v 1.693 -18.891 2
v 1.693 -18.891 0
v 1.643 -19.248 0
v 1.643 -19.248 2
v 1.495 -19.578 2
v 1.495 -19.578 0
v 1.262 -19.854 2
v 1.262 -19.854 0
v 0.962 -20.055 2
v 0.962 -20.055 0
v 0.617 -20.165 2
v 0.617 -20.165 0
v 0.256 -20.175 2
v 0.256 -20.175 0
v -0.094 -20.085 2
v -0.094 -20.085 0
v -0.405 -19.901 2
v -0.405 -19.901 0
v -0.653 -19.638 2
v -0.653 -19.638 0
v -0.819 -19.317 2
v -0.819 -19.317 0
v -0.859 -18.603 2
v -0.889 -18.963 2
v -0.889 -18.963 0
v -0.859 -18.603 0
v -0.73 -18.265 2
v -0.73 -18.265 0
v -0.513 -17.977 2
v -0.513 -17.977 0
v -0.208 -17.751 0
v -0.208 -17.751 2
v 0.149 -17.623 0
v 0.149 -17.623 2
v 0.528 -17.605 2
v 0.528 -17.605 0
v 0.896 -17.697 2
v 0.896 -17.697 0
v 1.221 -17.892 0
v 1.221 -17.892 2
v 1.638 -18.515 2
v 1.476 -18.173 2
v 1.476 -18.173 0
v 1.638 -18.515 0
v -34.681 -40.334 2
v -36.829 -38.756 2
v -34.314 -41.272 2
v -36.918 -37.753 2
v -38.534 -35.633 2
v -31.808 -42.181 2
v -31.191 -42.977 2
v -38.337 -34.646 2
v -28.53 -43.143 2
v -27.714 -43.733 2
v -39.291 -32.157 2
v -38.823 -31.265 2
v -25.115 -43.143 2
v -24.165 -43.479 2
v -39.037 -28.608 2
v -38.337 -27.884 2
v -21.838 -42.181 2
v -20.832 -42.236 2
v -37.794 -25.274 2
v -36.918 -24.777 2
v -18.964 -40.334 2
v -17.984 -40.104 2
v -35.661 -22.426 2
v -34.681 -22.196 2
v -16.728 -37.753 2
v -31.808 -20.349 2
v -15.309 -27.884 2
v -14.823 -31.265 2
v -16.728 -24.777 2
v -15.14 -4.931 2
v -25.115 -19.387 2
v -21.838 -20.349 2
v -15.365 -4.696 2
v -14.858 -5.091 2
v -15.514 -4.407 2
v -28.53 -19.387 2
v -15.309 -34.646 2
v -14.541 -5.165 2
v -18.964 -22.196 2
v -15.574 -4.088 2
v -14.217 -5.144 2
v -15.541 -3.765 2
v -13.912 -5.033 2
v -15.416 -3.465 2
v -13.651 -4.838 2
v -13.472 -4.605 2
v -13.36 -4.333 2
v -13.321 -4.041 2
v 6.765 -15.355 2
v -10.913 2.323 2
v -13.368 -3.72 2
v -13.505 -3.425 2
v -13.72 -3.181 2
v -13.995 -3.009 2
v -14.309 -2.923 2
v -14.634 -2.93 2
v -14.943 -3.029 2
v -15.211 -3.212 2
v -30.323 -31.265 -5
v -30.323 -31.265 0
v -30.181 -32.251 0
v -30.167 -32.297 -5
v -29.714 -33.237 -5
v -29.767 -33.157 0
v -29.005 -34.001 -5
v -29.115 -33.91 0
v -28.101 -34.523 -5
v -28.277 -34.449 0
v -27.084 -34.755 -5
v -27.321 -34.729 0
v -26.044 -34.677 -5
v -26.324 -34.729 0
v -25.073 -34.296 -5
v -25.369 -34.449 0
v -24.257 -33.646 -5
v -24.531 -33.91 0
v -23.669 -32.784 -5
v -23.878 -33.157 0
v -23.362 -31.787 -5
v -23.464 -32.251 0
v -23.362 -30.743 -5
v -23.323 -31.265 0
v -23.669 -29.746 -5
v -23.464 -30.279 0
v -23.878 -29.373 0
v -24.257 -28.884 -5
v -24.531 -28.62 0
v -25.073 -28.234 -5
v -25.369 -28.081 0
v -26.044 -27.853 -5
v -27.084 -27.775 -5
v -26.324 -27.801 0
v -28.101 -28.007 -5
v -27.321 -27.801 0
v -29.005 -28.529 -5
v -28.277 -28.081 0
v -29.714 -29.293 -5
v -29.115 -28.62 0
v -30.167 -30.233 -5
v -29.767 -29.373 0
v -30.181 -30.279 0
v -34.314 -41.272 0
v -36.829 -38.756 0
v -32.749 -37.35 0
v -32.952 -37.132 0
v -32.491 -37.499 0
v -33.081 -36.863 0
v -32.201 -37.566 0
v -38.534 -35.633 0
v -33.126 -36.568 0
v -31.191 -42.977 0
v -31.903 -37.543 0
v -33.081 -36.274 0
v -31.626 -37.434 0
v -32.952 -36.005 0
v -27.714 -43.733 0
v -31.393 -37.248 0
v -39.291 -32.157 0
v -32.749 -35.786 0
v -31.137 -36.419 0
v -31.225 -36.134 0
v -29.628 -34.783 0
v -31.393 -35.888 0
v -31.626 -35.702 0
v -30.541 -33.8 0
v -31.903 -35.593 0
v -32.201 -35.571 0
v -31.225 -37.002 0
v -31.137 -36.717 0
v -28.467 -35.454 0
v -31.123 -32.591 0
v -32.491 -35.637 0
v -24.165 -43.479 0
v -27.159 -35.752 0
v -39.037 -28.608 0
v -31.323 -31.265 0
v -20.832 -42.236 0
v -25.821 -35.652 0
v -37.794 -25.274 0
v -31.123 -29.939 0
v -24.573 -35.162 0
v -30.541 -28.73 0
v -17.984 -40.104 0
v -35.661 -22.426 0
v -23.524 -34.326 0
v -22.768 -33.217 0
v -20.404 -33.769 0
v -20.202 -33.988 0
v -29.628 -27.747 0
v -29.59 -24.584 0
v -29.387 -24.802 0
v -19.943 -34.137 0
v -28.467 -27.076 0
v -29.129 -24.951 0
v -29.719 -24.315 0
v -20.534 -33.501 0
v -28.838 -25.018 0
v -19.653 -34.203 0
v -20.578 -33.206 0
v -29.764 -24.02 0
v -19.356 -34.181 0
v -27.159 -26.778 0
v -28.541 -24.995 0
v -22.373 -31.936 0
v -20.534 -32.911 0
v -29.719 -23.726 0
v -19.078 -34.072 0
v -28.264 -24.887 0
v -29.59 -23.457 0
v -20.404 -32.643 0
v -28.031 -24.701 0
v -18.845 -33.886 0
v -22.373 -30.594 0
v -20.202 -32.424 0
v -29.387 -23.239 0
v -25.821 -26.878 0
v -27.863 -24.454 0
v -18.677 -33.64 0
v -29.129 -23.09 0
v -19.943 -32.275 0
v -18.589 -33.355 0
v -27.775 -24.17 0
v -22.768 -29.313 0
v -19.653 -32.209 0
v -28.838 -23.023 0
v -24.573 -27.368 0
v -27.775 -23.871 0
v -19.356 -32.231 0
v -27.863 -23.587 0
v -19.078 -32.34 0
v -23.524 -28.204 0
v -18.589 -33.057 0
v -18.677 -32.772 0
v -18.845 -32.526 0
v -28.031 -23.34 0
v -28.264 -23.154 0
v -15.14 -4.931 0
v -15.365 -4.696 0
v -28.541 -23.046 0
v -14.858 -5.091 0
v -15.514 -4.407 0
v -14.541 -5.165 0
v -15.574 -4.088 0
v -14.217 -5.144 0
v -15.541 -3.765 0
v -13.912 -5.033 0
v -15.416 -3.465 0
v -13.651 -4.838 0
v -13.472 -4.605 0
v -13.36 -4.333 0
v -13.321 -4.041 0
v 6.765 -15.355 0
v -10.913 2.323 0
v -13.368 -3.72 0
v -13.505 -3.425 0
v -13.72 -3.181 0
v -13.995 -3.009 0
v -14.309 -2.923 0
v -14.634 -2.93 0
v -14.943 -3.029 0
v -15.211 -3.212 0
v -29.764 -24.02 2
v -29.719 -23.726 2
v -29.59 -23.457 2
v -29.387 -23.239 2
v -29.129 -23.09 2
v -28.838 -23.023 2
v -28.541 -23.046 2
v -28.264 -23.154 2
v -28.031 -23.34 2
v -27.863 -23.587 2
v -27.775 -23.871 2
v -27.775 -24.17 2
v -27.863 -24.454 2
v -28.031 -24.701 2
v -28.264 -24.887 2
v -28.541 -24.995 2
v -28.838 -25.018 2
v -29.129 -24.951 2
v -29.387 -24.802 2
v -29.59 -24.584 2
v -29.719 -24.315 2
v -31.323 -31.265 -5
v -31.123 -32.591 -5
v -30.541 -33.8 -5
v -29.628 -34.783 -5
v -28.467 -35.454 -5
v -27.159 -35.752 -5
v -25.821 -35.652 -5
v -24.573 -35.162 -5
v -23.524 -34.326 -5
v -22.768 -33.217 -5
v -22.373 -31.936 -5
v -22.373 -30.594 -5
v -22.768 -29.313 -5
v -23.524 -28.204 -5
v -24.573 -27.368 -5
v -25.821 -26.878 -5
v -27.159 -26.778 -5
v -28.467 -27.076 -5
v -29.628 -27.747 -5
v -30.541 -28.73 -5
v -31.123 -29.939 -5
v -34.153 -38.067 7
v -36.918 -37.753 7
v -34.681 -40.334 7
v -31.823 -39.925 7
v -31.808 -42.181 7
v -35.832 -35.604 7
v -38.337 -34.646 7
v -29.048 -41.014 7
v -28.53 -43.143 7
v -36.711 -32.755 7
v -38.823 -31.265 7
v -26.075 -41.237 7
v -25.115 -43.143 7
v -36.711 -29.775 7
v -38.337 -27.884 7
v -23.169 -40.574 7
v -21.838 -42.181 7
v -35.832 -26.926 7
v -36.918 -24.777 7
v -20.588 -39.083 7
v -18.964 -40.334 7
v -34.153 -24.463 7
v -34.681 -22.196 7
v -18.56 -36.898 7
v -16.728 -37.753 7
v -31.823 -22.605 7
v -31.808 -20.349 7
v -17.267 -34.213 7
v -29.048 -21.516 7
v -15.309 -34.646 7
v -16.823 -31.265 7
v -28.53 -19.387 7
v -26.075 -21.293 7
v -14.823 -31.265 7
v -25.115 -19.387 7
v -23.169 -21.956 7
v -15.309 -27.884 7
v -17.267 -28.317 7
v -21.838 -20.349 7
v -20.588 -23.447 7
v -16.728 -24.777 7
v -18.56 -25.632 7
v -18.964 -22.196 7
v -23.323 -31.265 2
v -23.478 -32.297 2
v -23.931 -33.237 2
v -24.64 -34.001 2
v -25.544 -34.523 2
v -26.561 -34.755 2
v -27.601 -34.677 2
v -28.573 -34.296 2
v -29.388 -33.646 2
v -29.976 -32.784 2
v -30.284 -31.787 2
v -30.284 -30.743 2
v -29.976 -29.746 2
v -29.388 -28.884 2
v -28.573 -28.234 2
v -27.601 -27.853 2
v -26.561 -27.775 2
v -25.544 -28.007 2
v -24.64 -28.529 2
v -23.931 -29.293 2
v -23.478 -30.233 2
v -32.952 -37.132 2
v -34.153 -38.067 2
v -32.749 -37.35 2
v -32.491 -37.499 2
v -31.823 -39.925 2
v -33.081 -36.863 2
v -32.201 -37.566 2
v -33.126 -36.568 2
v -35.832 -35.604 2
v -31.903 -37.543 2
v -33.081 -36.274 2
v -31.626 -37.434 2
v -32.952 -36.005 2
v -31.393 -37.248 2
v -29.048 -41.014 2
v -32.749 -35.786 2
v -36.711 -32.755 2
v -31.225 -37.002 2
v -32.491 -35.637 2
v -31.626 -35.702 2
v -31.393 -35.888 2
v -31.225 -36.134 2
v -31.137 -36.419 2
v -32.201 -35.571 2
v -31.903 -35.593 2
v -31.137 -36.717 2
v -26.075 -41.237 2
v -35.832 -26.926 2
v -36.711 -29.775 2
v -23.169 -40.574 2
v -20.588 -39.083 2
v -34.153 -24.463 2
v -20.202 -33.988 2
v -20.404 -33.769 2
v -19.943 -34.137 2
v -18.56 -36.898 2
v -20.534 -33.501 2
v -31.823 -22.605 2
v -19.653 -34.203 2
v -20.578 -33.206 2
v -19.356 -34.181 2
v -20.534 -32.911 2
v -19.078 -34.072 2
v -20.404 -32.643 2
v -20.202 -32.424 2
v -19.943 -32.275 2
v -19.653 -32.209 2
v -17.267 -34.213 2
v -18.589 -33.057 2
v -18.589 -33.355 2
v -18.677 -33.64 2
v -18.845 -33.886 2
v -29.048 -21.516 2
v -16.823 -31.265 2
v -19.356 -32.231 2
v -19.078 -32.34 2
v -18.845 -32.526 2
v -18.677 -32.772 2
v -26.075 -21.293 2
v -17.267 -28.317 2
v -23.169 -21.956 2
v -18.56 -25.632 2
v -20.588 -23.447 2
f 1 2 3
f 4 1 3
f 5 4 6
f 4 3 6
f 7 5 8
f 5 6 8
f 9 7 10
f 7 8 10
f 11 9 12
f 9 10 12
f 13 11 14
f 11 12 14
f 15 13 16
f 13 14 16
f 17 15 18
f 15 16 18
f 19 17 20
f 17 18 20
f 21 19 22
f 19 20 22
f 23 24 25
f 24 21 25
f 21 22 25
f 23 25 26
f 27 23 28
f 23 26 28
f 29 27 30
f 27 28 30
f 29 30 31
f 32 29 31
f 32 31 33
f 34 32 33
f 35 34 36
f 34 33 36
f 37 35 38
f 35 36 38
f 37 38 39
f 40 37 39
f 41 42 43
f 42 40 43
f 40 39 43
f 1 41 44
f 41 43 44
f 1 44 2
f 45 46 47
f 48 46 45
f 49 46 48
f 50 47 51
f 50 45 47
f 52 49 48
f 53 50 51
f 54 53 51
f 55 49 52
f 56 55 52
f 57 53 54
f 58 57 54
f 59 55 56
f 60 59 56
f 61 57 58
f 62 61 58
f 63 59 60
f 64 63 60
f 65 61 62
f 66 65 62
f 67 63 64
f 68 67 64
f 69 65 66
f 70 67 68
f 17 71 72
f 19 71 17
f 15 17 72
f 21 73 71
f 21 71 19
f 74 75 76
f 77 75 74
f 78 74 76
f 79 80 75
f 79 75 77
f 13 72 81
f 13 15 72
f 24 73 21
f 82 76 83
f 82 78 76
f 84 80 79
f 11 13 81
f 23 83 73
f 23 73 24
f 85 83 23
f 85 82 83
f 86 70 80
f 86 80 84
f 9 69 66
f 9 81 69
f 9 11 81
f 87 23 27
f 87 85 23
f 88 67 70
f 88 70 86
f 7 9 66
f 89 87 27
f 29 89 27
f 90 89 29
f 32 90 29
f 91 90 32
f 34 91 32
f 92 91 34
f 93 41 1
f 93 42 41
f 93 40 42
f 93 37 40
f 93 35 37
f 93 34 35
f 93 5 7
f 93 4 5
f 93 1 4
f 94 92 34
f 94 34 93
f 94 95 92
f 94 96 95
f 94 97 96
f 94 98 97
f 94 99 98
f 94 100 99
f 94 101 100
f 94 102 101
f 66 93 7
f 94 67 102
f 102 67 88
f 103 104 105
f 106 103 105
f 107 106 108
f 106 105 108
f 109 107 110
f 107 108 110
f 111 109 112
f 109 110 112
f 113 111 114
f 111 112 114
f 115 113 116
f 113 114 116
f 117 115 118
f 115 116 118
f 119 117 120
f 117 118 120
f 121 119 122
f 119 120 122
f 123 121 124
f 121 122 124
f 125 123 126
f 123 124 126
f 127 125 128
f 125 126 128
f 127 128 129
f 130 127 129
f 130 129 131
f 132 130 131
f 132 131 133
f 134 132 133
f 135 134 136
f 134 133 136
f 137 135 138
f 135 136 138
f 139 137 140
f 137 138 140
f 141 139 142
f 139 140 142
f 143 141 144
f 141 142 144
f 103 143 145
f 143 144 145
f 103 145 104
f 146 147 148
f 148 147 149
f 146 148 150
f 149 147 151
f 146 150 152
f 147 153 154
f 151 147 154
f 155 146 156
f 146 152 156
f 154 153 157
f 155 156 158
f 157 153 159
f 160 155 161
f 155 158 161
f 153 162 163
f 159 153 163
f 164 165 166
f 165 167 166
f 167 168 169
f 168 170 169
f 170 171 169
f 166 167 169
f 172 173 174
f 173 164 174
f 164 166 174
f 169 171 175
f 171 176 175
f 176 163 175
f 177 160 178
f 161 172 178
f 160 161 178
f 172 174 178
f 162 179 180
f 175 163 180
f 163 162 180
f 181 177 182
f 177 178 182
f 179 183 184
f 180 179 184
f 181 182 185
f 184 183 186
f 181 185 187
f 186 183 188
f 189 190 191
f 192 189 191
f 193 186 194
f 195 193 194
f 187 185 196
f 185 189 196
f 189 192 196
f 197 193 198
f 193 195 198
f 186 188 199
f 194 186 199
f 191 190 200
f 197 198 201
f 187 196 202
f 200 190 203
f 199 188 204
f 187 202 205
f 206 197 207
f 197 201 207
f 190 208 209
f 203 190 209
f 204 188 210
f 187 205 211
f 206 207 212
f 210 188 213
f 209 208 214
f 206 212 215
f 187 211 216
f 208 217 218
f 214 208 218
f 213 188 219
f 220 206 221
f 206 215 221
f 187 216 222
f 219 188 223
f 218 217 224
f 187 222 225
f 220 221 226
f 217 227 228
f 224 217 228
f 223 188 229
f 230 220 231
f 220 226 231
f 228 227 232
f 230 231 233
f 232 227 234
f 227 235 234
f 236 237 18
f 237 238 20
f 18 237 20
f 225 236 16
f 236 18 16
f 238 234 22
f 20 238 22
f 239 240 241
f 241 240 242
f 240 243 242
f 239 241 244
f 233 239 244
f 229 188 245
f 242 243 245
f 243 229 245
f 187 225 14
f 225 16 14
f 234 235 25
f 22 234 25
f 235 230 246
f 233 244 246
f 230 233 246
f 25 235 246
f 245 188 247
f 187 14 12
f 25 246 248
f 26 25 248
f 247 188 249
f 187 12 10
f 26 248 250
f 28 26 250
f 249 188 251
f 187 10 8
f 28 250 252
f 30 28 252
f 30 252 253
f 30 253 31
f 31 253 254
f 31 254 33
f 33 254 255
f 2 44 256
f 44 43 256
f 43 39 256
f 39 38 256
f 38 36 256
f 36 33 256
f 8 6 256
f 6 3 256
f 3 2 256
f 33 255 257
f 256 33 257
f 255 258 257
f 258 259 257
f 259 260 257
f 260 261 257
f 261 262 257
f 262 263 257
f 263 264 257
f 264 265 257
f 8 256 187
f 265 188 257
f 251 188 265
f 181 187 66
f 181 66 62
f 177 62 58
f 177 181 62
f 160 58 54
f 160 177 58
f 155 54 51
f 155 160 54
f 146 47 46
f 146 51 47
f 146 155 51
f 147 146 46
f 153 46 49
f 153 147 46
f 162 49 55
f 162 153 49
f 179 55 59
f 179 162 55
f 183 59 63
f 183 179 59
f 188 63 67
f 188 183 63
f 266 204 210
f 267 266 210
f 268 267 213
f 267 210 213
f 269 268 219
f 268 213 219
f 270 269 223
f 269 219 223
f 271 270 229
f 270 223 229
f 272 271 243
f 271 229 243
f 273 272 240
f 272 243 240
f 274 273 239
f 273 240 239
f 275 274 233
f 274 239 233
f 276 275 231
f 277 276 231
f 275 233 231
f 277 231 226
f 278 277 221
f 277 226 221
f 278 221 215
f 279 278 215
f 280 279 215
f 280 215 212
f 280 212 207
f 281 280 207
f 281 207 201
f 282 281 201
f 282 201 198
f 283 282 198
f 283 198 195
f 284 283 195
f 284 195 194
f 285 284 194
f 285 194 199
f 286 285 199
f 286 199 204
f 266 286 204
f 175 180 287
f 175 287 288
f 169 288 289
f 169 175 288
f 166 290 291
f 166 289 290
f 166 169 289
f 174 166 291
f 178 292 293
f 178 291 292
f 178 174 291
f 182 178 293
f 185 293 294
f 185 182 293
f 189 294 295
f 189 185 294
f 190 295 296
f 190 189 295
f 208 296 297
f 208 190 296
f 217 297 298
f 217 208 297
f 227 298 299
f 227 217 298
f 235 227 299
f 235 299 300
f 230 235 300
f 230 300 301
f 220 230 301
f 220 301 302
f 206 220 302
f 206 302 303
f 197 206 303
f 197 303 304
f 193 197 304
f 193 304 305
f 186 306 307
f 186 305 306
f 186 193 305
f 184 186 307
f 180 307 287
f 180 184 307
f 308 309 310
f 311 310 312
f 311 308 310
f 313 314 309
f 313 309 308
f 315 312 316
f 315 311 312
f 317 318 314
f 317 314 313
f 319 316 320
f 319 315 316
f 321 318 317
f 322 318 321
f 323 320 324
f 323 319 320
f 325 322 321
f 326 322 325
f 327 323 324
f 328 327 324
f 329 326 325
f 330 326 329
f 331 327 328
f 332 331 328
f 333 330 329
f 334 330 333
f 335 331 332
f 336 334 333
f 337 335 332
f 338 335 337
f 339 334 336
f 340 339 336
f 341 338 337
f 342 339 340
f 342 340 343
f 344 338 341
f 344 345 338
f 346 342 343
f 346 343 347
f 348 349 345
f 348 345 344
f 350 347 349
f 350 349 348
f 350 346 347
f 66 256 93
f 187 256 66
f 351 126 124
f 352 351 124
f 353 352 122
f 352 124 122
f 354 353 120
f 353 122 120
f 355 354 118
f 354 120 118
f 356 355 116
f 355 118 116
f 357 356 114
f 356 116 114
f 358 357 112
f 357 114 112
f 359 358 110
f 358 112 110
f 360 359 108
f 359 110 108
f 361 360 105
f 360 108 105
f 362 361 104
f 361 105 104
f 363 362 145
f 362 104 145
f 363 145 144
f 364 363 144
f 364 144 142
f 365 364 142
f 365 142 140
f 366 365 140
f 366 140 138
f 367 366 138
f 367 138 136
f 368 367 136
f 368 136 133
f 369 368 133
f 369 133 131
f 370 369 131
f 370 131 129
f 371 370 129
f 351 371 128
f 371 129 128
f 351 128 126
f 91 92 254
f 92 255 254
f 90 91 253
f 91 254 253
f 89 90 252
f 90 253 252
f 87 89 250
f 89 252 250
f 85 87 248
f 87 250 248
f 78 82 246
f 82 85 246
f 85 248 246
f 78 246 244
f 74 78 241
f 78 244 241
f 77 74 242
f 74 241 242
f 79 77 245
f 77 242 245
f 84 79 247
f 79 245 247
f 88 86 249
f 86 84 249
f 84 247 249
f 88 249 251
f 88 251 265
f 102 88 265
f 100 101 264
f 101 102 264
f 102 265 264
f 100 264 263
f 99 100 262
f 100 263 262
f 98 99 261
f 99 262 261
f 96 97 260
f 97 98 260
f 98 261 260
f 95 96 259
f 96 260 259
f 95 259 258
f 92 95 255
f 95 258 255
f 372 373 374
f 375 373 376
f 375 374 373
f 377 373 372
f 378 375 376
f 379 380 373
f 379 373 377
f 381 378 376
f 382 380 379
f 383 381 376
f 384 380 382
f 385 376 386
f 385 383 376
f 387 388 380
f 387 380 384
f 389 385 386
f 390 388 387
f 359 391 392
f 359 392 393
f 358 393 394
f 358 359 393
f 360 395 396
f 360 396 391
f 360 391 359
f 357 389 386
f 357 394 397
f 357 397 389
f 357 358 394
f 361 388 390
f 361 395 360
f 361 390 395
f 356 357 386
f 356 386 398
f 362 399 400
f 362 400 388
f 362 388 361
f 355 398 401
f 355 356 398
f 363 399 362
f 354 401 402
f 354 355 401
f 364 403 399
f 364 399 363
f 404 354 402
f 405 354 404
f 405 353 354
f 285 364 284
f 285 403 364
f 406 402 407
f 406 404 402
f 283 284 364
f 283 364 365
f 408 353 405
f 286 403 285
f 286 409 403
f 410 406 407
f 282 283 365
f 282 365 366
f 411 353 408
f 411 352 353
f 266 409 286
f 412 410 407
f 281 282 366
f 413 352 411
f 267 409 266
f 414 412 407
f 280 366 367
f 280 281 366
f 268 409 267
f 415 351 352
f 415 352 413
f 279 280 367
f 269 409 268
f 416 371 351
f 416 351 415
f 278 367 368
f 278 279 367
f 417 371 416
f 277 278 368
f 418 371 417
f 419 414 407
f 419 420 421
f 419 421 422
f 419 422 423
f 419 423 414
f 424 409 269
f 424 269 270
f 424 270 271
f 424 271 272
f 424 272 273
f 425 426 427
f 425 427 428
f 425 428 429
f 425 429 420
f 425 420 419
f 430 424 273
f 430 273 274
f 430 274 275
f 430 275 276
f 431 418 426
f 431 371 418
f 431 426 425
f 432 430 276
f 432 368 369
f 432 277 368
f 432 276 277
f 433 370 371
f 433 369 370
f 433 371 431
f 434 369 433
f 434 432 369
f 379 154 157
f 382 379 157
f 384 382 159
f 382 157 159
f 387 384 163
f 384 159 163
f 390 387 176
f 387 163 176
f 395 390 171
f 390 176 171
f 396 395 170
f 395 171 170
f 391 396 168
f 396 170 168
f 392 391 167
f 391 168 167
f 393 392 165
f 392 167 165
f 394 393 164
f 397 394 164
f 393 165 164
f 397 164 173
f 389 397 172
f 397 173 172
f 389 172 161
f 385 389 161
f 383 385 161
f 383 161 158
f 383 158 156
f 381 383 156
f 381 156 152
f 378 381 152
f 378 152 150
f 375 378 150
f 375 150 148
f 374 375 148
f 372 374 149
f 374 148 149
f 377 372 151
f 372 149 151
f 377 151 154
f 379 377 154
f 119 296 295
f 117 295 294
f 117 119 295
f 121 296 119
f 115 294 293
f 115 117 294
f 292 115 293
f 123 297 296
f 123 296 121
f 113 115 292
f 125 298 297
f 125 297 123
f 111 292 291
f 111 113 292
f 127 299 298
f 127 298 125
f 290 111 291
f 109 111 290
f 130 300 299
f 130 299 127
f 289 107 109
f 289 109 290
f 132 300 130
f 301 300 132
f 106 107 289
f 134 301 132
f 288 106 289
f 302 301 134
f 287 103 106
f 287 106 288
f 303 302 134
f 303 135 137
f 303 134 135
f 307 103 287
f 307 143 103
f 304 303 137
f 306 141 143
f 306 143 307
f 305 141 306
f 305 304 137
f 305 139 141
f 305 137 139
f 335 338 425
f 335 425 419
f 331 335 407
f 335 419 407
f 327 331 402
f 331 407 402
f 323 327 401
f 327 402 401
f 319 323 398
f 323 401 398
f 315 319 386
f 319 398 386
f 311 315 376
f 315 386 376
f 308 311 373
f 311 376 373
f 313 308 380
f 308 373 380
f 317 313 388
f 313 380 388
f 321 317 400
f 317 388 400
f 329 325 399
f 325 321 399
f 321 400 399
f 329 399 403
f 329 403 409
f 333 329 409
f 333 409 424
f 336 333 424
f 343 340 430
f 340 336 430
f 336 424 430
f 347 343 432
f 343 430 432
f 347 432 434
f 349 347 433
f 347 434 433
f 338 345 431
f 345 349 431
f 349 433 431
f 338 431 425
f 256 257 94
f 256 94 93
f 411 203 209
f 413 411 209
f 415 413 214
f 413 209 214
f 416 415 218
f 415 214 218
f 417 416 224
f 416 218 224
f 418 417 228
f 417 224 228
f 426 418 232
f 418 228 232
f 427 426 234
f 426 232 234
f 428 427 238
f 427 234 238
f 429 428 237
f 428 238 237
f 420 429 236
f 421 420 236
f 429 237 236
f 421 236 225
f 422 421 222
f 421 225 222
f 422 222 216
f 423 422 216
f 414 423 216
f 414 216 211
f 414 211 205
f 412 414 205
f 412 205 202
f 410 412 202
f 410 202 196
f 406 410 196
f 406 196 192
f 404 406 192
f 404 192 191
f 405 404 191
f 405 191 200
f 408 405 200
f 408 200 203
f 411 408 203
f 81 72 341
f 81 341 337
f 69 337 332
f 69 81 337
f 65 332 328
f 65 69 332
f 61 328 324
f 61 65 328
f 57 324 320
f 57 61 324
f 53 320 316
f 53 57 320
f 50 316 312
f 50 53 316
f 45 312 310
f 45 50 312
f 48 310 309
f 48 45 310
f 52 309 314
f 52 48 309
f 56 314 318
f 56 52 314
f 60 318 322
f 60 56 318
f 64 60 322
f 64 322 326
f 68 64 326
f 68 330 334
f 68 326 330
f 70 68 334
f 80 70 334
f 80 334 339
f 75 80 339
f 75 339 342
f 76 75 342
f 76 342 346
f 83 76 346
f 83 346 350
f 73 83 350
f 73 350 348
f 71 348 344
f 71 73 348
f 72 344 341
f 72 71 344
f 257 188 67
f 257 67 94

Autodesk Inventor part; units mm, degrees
ref_plane "YZ Plane" through (0, 0, 0) normal (1, 0, 0) x (0, 1, 0)
ref_plane "XZ Plane" through (0, 0, 0) normal (0, 1, 0) x (-1, 0, 0)
ref_plane "XY Plane" through (0, 0, 0) normal (0, 0, 1) x (1, 0, 0)
sketch "Sketch1" plane through (0, 0, 0) normal (0, 0, 1) x (1, 0, 0)
  circle A0 centre (-26.8226, -31.265) radius 3.5
  arc A1 (-35.6614, -22.4261) -> (-17.9837, -40.1038) centre (-26.8226, -31.265) ccw
  circle A2 centre (38.1774, 33.735) radius 1.5
  circle A3 centre (-14.4482, -4.0414) radius 1
  circle A4 centre (0.401, -18.8906) radius 1
  line L0 (-14.4482, -4.0414) -> (0.401, -18.8906)
  line L1 (-17.9837, -40.1038) -> (-35.6614, -22.4261)
  line L2 (-35.6614, -22.4261) -> (-10.9127, 2.3226)
  line L3 (-35.6614, -22.4261) -> (-10.9127, 2.3226)
  line L4 (-10.9127, 2.3226) -> (6.765, -15.3551)
  line L5 (6.765, -15.3551) -> (-17.9837, -40.1038)
  circle A5 centre (-14.4482, -4.0414) radius 1.127
  circle A6 centre (0.401, -18.8906) radius 1.2923
  circle A7 centre (0.401, -18.8906) radius 1.0598
  line L6 (-26.8226, -31.265) -> (-2.0738, -6.5162)
  line L7 (37.1168, 32.6744) -> (38.1774, 33.735)
  point P0 (0, 0)
  point P1 (38.1774, -31.265)
  dimension "d0" = 35
extrude "Extrusion1" add sketch "Sketch1" along normal blind 2 contours A0 L6 L4 L5 L1 | A0 L1 L2 L4 L6 | L1 A1 A0
sketch "Sketch2" plane through (0, 0, 2) normal (0, 0, 1) x (1, 0, 0)
  circle A0 centre (-26.8226, -31.265) radius 3.5 projected
  circle A1 centre (-26.8226, -31.265) radius 10
  circle A2 centre (-26.8226, -31.265) radius 12
  point P0 (0, 0)
  dimension "d3" = 20
  dimension "d4" = 2
extrude "Extrusion2" add sketch "Sketch2" along normal blind 5 contours A2
sketch "Sketch3" plane through (0, 0, 0) normal (0, 0, -1) x (-1, 0, 0)
  line L0 (-6.765, -15.3551) -> (10.9127, 2.3226) projected
  line L1 (2.0738, -6.5162) -> (35.766, -40.2084)
  circle A0 centre (26.8226, -31.265) radius 3.5 projected
  arc A1 (17.9837, -40.1038) -> (35.6614, -22.4261) centre (26.8226, -31.265) ccw projected
  line L2 (26.8226, -31.265) -> (17.9837, -40.1038)
  circle A2 centre (32.1259, -36.5683) radius 1
  circle A3 centre (28.7637, -24.0205) radius 1
  circle A4 centre (19.5781, -33.2061) radius 1
  point P0 (0, 0)
  dimension "d7" = 2
  dimension "d8" = 15
  dimension "d11" = 360
extrude "Extrusion3" cut sketch "Sketch3" against normal blind 5 contours A2 L1 | L1 A2 | A3 | A4
sketch "Sketch4" plane through (0, 0, 0) normal (0, 0, -1) x (-1, 0, 0)
  circle A0 centre (32.1259, -36.5683) radius 1 projected
  circle A1 centre (19.5781, -33.2061) radius 1 projected
  circle A2 centre (28.7637, -24.0205) radius 1 projected
  line L0 (17.9837, -40.1038) -> (-6.765, -15.3551) projected
  arc A3 (17.9837, -40.1038) -> (35.6614, -22.4261) centre (26.8226, -31.265) ccw projected
  line L1 (10.9127, 2.3226) -> (35.6614, -22.4261) projected
  line L2 (-6.765, -15.3551) -> (10.9127, 2.3226) projected
  circle A4 centre (14.4482, -4.0414) radius 1.127 projected
  circle A5 centre (-0.401, -18.8906) radius 1.2923 projected
  circle A6 centre (26.8226, -31.265) radius 3.5 projected
  circle A7 centre (26.8226, -31.265) radius 4.5
  point P0 (0, 0)
  dimension "d15" = 1
extrude "Extrusion4" add sketch "Sketch4" along normal blind 5 contours A7
sketch "Sketch5" plane through (0, 0, 0) normal (1, 0, 0) x (0, 1, 0)
  point P0 (0, 0)
sketch "Sketch6" plane through (0, 0, 0) normal (0, 0, -1) x (-1, 0, 0)
  point P0 (0, 0)
properties part number "motorbracket"
